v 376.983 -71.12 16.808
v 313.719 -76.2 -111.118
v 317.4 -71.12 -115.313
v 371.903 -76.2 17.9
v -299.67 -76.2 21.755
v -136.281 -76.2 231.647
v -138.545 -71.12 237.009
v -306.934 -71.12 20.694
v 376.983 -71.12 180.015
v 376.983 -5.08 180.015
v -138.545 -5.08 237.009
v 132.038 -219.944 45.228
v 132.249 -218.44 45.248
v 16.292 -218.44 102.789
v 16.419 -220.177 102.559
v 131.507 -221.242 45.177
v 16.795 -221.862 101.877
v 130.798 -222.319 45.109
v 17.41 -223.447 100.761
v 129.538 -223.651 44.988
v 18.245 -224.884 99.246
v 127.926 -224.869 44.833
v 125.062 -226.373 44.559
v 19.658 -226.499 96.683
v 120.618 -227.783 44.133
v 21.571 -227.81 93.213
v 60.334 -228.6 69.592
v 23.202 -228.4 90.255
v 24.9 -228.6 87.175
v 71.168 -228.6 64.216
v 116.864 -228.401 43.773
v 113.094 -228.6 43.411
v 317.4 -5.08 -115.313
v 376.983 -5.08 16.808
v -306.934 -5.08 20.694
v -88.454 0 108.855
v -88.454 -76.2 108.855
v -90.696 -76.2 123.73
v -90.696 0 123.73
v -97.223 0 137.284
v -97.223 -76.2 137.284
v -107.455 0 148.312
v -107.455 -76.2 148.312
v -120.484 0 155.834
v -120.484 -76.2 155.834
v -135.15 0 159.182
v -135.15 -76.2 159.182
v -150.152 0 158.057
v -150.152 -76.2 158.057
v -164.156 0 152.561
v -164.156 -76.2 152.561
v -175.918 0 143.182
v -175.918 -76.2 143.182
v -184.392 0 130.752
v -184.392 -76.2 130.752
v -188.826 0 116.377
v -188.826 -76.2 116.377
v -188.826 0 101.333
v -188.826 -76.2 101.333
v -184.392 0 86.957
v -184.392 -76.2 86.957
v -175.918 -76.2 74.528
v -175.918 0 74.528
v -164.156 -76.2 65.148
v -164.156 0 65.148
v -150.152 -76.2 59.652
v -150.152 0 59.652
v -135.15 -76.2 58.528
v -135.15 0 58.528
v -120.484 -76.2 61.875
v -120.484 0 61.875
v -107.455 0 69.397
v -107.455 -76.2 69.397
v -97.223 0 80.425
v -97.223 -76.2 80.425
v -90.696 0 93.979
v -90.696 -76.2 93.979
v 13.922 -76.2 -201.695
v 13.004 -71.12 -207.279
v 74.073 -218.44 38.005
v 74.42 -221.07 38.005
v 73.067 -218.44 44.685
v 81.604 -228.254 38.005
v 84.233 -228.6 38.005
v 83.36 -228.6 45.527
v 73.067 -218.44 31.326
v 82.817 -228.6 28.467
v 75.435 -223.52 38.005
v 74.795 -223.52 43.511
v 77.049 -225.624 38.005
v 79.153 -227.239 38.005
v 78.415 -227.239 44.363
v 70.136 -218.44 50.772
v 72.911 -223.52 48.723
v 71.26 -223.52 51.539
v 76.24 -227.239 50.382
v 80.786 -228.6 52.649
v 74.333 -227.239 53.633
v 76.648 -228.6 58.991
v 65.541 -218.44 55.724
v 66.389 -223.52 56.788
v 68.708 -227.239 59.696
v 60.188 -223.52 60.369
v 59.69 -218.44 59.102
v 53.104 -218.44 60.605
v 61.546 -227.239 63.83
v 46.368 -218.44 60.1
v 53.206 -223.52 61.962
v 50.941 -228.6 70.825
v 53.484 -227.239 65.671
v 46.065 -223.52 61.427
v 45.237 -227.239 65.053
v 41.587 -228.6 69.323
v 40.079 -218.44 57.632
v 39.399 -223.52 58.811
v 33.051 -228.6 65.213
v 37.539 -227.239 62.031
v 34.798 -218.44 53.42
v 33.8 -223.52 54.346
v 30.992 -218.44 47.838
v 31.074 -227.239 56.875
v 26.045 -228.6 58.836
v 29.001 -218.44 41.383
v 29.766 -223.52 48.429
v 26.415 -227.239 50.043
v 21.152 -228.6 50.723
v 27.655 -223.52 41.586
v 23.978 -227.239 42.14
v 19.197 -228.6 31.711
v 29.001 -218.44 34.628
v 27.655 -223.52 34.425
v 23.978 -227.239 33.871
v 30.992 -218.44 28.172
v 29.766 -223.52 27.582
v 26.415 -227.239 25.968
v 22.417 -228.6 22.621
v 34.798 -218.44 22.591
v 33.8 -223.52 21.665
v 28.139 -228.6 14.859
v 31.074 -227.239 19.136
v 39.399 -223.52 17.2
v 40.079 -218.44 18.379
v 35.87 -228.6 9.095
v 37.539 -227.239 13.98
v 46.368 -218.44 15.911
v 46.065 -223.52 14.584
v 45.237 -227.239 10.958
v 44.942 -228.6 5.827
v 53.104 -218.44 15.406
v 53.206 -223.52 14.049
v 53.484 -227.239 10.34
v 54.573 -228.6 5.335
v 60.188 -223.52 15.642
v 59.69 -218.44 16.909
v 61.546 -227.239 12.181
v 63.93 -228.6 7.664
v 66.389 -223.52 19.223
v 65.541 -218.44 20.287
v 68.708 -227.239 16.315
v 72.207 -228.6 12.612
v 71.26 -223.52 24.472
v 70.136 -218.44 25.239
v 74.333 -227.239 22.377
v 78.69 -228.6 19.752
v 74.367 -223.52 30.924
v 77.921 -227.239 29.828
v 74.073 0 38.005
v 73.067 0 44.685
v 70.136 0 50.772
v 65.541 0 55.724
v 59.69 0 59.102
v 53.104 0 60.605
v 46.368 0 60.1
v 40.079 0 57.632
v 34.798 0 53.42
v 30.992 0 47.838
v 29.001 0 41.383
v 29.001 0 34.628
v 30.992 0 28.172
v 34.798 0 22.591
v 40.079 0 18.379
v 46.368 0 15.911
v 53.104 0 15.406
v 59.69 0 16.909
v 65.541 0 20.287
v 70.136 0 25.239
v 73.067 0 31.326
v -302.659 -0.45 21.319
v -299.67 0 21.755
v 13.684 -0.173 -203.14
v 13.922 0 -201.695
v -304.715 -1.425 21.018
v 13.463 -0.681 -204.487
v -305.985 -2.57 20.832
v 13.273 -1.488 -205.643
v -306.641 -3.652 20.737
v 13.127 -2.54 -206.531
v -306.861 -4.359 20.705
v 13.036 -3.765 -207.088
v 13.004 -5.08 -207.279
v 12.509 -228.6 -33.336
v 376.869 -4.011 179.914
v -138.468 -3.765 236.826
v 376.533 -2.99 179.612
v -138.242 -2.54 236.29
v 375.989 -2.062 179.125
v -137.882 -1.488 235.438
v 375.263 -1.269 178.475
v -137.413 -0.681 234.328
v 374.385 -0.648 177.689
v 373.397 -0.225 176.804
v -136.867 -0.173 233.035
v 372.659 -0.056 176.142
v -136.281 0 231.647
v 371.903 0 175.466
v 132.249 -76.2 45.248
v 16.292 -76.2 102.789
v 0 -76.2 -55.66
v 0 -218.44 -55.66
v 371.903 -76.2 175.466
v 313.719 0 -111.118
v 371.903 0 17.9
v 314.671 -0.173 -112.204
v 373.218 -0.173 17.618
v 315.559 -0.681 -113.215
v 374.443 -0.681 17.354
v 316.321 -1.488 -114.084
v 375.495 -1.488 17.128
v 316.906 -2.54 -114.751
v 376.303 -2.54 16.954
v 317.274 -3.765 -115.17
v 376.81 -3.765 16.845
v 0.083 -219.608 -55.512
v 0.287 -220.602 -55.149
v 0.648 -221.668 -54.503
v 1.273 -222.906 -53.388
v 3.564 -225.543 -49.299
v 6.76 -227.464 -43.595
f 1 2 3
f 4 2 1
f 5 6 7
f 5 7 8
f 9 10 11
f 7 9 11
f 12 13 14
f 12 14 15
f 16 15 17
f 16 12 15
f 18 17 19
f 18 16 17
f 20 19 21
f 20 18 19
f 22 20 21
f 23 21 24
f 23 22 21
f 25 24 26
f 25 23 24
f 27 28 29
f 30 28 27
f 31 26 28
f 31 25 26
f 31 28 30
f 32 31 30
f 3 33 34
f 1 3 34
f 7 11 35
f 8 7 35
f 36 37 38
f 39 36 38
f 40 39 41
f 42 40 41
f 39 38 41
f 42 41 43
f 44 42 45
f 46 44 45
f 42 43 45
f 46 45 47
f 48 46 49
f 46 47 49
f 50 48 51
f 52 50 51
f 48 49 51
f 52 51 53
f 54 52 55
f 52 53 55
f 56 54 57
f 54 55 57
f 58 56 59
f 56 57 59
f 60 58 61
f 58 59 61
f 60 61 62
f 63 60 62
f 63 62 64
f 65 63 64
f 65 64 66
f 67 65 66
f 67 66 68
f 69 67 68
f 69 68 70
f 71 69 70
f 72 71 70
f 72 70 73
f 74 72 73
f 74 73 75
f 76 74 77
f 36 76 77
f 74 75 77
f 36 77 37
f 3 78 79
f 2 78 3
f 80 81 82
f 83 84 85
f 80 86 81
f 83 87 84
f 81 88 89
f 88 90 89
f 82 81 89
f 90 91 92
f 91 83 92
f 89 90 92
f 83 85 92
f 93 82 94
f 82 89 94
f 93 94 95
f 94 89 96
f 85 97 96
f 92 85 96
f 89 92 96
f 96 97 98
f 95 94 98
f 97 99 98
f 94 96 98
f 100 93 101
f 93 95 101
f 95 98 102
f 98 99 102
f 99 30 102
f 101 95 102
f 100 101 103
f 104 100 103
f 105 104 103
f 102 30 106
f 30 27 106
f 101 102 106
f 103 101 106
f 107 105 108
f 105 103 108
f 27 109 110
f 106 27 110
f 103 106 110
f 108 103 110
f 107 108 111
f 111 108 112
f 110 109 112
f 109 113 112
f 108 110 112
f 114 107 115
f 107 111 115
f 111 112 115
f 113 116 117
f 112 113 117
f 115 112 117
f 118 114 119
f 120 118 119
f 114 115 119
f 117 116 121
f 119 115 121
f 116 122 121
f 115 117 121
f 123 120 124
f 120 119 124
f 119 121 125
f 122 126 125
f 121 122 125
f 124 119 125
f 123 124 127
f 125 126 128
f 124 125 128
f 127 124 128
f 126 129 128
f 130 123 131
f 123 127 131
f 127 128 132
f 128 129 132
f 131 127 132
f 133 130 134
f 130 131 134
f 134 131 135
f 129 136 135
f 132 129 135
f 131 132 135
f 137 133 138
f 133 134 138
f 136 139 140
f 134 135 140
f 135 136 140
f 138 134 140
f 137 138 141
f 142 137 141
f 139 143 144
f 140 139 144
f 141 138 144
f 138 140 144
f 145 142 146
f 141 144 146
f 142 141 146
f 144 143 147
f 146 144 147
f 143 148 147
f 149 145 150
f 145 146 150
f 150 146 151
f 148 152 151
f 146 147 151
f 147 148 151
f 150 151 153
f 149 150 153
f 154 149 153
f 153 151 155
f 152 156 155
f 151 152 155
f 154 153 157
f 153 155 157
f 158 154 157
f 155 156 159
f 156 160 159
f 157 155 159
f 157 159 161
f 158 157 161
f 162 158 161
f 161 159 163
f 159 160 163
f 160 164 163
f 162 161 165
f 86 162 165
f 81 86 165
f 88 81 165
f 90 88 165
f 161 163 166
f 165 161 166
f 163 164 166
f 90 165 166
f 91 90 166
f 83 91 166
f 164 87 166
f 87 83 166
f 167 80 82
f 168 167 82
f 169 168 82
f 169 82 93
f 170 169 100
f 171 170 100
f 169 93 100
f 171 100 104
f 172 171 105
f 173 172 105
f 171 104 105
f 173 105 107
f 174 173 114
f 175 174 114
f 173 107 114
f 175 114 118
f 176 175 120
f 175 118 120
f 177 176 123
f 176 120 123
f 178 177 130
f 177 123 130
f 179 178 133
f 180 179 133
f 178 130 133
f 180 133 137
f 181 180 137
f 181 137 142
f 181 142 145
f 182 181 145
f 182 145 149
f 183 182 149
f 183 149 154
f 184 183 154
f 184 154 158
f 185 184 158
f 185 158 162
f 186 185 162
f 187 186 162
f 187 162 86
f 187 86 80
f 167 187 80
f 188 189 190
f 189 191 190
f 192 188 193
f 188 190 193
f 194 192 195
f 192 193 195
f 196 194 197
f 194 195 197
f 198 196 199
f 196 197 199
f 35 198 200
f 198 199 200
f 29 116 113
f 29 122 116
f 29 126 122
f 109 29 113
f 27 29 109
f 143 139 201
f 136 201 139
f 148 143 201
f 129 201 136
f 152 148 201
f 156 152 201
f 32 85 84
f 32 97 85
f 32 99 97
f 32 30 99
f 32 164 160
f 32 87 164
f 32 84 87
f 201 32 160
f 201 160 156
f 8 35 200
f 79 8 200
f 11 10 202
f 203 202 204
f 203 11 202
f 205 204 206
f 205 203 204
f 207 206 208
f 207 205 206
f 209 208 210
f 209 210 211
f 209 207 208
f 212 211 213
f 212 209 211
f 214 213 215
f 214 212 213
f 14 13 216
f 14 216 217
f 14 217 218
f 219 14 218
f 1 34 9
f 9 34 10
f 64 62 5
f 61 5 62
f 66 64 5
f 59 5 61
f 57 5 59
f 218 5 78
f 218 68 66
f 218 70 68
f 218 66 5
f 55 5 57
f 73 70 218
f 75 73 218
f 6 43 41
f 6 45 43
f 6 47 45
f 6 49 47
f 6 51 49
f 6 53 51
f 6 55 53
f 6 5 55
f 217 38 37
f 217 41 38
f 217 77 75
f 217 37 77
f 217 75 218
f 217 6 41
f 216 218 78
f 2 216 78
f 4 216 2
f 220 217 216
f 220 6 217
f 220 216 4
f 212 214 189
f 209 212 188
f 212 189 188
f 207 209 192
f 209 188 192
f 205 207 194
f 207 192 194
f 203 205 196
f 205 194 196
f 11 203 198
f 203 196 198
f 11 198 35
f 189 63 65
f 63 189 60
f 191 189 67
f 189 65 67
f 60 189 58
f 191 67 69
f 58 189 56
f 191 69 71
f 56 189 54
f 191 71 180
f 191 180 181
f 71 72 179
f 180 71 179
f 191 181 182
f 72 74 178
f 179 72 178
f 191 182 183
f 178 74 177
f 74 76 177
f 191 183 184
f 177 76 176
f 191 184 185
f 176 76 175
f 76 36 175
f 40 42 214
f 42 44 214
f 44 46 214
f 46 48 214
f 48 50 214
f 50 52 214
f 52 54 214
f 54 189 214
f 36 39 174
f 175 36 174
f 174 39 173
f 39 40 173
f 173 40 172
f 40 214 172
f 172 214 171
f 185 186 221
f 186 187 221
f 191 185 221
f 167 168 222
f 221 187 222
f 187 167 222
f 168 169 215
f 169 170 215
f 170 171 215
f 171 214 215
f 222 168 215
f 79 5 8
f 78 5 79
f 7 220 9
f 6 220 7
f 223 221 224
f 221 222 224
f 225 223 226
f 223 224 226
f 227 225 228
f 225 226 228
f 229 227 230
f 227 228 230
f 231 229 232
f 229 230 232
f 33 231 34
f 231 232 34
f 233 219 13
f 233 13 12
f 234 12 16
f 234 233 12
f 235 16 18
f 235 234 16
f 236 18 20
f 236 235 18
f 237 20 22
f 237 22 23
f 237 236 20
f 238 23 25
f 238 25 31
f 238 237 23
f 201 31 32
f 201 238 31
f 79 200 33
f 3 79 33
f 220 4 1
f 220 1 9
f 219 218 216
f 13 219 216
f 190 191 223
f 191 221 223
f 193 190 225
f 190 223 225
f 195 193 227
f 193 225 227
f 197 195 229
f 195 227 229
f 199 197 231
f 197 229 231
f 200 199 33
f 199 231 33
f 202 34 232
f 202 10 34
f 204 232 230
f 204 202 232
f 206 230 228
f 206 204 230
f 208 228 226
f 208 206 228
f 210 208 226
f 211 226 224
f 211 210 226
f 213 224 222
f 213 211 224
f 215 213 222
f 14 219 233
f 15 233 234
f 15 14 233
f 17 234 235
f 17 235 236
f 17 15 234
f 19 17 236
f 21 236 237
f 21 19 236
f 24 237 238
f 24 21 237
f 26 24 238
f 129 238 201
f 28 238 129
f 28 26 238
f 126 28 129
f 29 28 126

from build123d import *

# Parameters (mm, degrees)
F1_DEPTH     = 76.2
F2_SIZE      = 5.08
F4_DEPTH     = 152.4
F5_R         = 50.4680515056
F6_DEPTH     = 76.2
F7_R         = 22.662684834
F8_DEPTH     = 228.6
F9_R         = 5.08
F10_T1_DEPTH = 217.1500590573
F10_T3_DEPTH = 210.0843614146
F10_T5_DEPTH = 180.2491648874


# Not quite as in the source:
# - a fillet or chamfer that OpenCascade refuses, or shapes differently, is made with other operations: its cross-section is extruded or revolved along the edge and cut away or added


with BuildPart() as f1:
    # F0 (on Front) → F1 (new body)
    with BuildSketch(Plane.XZ):
        Polygon((376.9832551479, 180.0154298544), (-138.5454237461, 237.0085567236), (-306.9341778755, 20.6937491894), (13.0044706166, -207.2787433863), (317.3995614052, -115.3125613928), (376.9832551479, 16.8078560382), align=None)
    extrude(amount=F1_DEPTH)

    # F2
    f2_edges = [f1.edges().sort_by_distance(p)[0] for p in [
        (-146.964854, -76.2, -93.292497),
        (165.202016, -76.2, -161.295652),
        (347.191408, -76.2, -49.252353),
        (376.983255, -76.2, 98.411643),
        (119.218916, -76.2, 208.511993),
        (-222.739801, -76.2, 128.851153),
    ]]
    chamfer(f2_edges, length=F2_SIZE)

    # F3 (on face) → F4 (join)
    with BuildSketch(Plane.XZ.offset(76.2)):
        Polygon((132.2494894266, 45.2478192747), (16.2920933217, 102.7888357639), (0, -55.6601323187), align=None)
    extrude(amount=F4_DEPTH)

    # F5 (on face) → F6 (cut)
    with BuildSketch(Plane.XZ.offset(76.2)):
        with Locations((-138.9218121767, 108.8546961546)):
            Circle(F5_R)
    extrude(amount=-F6_DEPTH, mode=Mode.SUBTRACT)

    # F7 (on face) → F8 (cut)
    with BuildSketch(Plane.XZ.offset(228.6)):
        with Locations((51.4107942581, 38.0054563284)):
            Circle(F7_R)
    extrude(amount=-F8_DEPTH, mode=Mode.SUBTRACT)

    # F9
    f9_edges = [f1.edges().sort_by_distance(p)[0] for p in [
        (-146.964854, 0, -93.292497),
        (165.202016, 0, -161.295652),
        (347.191408, 0, -49.252353),
        (376.983255, 0, 98.411643),
        (119.218916, 0, 208.511993),
        (-222.739801, 0, 128.851153),
    ]]
    fillet(f9_edges, radius=F9_R)

    # F10: fillet of radius 10.16 on 4 edges, made by hand

    # F10_s2 → F10_t1 (cut)
    with BuildSketch(Plane(origin=(-47.0353574765, 0, -35.8885436609), x_dir=(0, 1, 0), z_dir=(0.7950071685, 0, 0.6066000347))):
        with BuildLine():
            ThreePointArc((-218.44, -44.2502041916), (-225.6242048969, -41.2744090884), (-228.6, -34.0902041916))
            Line((-228.6, -34.0902041916), (-228.6, -44.2502041916))
            Line((-228.6, -44.2502041916), (-218.44, -44.2502041916))
        make_face()
    extrude(amount=F10_T1_DEPTH, mode=Mode.SUBTRACT)

    # F10_s4 → F10_t3 (cut)
    with BuildSketch(Plane(origin=(13.2268524744, 0, 128.6379278687), x_dir=(0, 1, 0), z_dir=(-0.102283069, 0, -0.9947553336))):
        with BuildLine():
            ThreePointArc((-218.44, 5.6930891519), (-225.6242048969, 8.668884255), (-228.6, 15.8530891519))
            Line((-228.6, 15.8530891519), (-228.6, 5.6930891519))
            Line((-228.6, 5.6930891519), (-218.44, 5.6930891519))
        make_face()
    extrude(amount=F10_T3_DEPTH, mode=Mode.SUBTRACT)

    # F10_s6 → F10_t5 (cut)
    with BuildSketch(Plane(origin=(110.8548223357, 0, -55.0089892857), x_dir=(0, 1, 0), z_dir=(-0.8957755441, 0, 0.4445066644))):
        with BuildLine():
            ThreePointArc((-218.44, -99.3176693375), (-225.6242048969, -96.3418742344), (-228.6, -89.1576693375))
            Line((-228.6, -89.1576693375), (-228.6, -99.3176693375))
            Line((-228.6, -99.3176693375), (-218.44, -99.3176693375))
        make_face()
    extrude(amount=F10_T5_DEPTH, mode=Mode.SUBTRACT)

    # F10_s7 → F10_t8 (revolve, cut)
    with BuildSketch(Plane.XY.offset(38.0054563284)):
        with BuildLine():
            ThreePointArc((74.0734790921, -218.44), (77.0492741953, -225.6242048969), (84.2334790921, -228.6))
            Line((84.2334790921, -228.6), (74.0734790921, -228.6))
            Line((74.0734790921, -228.6), (74.0734790921, -218.44))
        make_face()
    revolve(axis=Axis((51.4107942581, -228.6, 38.0054563284), (0, -1, 0)), mode=Mode.SUBTRACT)


solid = f1.part
